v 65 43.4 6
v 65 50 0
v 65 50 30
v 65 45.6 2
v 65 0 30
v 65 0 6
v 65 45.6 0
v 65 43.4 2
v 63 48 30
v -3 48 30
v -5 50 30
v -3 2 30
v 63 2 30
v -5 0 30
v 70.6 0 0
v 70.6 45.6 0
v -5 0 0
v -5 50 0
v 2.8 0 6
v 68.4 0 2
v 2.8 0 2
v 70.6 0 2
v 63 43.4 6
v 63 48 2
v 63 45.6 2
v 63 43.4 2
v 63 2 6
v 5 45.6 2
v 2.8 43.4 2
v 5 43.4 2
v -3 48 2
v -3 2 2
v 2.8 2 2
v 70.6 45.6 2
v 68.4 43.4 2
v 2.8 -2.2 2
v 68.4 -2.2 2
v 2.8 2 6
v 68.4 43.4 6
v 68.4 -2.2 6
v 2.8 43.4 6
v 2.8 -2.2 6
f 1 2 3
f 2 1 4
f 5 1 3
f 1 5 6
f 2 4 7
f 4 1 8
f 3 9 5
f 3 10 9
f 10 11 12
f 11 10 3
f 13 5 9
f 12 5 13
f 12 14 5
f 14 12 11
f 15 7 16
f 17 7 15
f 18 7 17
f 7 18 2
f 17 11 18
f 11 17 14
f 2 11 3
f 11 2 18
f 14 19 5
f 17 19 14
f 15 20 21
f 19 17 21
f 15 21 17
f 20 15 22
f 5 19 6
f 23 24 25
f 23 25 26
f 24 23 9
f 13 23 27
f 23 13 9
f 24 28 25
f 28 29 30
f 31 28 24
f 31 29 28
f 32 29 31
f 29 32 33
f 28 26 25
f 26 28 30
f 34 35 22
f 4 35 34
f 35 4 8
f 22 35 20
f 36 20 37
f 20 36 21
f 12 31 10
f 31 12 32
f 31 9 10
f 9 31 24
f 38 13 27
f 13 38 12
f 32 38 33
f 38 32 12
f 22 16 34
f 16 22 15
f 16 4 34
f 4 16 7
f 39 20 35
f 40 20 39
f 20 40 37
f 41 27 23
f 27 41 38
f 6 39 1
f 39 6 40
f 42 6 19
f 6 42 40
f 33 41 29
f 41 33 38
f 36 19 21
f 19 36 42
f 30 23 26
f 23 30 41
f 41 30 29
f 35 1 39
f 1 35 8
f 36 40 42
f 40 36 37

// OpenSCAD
// Two-part enclosure for small electronics board (e.g., Arduino-based temp logger)
// Print orientation: both parts flat on the bed, lid on the +X side of the box,
// with a 10 mm gap between them, so they print together in one go.

// ---------------- Parameters ----------------
box_x      = 70;    // box outer size in X (mm)
box_y      = 50;    // box outer size in Y (mm)
box_z      = 30;    // box outer size in Z (mm)
box_wall   = 2;     // box wall thickness (mm)
box_floor  = 2;     // box floor thickness (mm)

lip_w      = 65.6;  // lid lip outer size in X (mm)
lip_d      = 45.6;  // lid lip outer size in Y (mm)
lip_h      = 4;     // lid lip height above plate (mm)
lip_t      = 1.5;   // lid lip wall thickness (mm)
lip_plate  = 2;     // lid plate thickness (mm)

gap        = 10;    // gap between box and lid on the bed (mm)

eps        = 0.5;   // cutter overshoot past faces (mm)

$fn = 64;           // curve resolution (no curved features here, set per rules)

// ---------------- Derived ----------------
inner_x = box_x - 2 * box_wall;   // 66 mm
inner_y = box_y - 2 * box_wall;   // 46 mm
// Lip outer size is 65.6 x 45.6, box inner is 66 x 46 -> 0.2 mm clearance each side
// Lip top face is at z = plate + lip_h = 6 mm above bed

// ---------------- Modules ----------------
module box() {
    difference() {
        translate([0, 0, 0])
            cube([box_x, box_y, box_z]);
        // Open-top cavity, walls and floor exactly as specified
        translate([box_wall, box_wall, box_floor])
            cube([inner_x, inner_y, box_z - box_floor]);
    }
}

module lid() {
    // Lid is printed upside down: plate on bed, lip on top of it
    union() {
        // Plate
        translate([0, 0, 0])
            cube([lip_w, lip_d, lip_plate]);
        // Lip: wall thick in X and Y, height lip_h
        translate([(lip_w - box_x) / 2, (lip_d - box_y) / 2, lip_plate])
            cube([box_x + (lip_w - box_x), box_y + (lip_d - box_y), lip_h]);
    }
}

// ---------------- Assembly ----------------
union() {
    translate([-gap / 2, 0, 0])
        box();
    translate([gap / 2, 0, 0])
        lid();
}
